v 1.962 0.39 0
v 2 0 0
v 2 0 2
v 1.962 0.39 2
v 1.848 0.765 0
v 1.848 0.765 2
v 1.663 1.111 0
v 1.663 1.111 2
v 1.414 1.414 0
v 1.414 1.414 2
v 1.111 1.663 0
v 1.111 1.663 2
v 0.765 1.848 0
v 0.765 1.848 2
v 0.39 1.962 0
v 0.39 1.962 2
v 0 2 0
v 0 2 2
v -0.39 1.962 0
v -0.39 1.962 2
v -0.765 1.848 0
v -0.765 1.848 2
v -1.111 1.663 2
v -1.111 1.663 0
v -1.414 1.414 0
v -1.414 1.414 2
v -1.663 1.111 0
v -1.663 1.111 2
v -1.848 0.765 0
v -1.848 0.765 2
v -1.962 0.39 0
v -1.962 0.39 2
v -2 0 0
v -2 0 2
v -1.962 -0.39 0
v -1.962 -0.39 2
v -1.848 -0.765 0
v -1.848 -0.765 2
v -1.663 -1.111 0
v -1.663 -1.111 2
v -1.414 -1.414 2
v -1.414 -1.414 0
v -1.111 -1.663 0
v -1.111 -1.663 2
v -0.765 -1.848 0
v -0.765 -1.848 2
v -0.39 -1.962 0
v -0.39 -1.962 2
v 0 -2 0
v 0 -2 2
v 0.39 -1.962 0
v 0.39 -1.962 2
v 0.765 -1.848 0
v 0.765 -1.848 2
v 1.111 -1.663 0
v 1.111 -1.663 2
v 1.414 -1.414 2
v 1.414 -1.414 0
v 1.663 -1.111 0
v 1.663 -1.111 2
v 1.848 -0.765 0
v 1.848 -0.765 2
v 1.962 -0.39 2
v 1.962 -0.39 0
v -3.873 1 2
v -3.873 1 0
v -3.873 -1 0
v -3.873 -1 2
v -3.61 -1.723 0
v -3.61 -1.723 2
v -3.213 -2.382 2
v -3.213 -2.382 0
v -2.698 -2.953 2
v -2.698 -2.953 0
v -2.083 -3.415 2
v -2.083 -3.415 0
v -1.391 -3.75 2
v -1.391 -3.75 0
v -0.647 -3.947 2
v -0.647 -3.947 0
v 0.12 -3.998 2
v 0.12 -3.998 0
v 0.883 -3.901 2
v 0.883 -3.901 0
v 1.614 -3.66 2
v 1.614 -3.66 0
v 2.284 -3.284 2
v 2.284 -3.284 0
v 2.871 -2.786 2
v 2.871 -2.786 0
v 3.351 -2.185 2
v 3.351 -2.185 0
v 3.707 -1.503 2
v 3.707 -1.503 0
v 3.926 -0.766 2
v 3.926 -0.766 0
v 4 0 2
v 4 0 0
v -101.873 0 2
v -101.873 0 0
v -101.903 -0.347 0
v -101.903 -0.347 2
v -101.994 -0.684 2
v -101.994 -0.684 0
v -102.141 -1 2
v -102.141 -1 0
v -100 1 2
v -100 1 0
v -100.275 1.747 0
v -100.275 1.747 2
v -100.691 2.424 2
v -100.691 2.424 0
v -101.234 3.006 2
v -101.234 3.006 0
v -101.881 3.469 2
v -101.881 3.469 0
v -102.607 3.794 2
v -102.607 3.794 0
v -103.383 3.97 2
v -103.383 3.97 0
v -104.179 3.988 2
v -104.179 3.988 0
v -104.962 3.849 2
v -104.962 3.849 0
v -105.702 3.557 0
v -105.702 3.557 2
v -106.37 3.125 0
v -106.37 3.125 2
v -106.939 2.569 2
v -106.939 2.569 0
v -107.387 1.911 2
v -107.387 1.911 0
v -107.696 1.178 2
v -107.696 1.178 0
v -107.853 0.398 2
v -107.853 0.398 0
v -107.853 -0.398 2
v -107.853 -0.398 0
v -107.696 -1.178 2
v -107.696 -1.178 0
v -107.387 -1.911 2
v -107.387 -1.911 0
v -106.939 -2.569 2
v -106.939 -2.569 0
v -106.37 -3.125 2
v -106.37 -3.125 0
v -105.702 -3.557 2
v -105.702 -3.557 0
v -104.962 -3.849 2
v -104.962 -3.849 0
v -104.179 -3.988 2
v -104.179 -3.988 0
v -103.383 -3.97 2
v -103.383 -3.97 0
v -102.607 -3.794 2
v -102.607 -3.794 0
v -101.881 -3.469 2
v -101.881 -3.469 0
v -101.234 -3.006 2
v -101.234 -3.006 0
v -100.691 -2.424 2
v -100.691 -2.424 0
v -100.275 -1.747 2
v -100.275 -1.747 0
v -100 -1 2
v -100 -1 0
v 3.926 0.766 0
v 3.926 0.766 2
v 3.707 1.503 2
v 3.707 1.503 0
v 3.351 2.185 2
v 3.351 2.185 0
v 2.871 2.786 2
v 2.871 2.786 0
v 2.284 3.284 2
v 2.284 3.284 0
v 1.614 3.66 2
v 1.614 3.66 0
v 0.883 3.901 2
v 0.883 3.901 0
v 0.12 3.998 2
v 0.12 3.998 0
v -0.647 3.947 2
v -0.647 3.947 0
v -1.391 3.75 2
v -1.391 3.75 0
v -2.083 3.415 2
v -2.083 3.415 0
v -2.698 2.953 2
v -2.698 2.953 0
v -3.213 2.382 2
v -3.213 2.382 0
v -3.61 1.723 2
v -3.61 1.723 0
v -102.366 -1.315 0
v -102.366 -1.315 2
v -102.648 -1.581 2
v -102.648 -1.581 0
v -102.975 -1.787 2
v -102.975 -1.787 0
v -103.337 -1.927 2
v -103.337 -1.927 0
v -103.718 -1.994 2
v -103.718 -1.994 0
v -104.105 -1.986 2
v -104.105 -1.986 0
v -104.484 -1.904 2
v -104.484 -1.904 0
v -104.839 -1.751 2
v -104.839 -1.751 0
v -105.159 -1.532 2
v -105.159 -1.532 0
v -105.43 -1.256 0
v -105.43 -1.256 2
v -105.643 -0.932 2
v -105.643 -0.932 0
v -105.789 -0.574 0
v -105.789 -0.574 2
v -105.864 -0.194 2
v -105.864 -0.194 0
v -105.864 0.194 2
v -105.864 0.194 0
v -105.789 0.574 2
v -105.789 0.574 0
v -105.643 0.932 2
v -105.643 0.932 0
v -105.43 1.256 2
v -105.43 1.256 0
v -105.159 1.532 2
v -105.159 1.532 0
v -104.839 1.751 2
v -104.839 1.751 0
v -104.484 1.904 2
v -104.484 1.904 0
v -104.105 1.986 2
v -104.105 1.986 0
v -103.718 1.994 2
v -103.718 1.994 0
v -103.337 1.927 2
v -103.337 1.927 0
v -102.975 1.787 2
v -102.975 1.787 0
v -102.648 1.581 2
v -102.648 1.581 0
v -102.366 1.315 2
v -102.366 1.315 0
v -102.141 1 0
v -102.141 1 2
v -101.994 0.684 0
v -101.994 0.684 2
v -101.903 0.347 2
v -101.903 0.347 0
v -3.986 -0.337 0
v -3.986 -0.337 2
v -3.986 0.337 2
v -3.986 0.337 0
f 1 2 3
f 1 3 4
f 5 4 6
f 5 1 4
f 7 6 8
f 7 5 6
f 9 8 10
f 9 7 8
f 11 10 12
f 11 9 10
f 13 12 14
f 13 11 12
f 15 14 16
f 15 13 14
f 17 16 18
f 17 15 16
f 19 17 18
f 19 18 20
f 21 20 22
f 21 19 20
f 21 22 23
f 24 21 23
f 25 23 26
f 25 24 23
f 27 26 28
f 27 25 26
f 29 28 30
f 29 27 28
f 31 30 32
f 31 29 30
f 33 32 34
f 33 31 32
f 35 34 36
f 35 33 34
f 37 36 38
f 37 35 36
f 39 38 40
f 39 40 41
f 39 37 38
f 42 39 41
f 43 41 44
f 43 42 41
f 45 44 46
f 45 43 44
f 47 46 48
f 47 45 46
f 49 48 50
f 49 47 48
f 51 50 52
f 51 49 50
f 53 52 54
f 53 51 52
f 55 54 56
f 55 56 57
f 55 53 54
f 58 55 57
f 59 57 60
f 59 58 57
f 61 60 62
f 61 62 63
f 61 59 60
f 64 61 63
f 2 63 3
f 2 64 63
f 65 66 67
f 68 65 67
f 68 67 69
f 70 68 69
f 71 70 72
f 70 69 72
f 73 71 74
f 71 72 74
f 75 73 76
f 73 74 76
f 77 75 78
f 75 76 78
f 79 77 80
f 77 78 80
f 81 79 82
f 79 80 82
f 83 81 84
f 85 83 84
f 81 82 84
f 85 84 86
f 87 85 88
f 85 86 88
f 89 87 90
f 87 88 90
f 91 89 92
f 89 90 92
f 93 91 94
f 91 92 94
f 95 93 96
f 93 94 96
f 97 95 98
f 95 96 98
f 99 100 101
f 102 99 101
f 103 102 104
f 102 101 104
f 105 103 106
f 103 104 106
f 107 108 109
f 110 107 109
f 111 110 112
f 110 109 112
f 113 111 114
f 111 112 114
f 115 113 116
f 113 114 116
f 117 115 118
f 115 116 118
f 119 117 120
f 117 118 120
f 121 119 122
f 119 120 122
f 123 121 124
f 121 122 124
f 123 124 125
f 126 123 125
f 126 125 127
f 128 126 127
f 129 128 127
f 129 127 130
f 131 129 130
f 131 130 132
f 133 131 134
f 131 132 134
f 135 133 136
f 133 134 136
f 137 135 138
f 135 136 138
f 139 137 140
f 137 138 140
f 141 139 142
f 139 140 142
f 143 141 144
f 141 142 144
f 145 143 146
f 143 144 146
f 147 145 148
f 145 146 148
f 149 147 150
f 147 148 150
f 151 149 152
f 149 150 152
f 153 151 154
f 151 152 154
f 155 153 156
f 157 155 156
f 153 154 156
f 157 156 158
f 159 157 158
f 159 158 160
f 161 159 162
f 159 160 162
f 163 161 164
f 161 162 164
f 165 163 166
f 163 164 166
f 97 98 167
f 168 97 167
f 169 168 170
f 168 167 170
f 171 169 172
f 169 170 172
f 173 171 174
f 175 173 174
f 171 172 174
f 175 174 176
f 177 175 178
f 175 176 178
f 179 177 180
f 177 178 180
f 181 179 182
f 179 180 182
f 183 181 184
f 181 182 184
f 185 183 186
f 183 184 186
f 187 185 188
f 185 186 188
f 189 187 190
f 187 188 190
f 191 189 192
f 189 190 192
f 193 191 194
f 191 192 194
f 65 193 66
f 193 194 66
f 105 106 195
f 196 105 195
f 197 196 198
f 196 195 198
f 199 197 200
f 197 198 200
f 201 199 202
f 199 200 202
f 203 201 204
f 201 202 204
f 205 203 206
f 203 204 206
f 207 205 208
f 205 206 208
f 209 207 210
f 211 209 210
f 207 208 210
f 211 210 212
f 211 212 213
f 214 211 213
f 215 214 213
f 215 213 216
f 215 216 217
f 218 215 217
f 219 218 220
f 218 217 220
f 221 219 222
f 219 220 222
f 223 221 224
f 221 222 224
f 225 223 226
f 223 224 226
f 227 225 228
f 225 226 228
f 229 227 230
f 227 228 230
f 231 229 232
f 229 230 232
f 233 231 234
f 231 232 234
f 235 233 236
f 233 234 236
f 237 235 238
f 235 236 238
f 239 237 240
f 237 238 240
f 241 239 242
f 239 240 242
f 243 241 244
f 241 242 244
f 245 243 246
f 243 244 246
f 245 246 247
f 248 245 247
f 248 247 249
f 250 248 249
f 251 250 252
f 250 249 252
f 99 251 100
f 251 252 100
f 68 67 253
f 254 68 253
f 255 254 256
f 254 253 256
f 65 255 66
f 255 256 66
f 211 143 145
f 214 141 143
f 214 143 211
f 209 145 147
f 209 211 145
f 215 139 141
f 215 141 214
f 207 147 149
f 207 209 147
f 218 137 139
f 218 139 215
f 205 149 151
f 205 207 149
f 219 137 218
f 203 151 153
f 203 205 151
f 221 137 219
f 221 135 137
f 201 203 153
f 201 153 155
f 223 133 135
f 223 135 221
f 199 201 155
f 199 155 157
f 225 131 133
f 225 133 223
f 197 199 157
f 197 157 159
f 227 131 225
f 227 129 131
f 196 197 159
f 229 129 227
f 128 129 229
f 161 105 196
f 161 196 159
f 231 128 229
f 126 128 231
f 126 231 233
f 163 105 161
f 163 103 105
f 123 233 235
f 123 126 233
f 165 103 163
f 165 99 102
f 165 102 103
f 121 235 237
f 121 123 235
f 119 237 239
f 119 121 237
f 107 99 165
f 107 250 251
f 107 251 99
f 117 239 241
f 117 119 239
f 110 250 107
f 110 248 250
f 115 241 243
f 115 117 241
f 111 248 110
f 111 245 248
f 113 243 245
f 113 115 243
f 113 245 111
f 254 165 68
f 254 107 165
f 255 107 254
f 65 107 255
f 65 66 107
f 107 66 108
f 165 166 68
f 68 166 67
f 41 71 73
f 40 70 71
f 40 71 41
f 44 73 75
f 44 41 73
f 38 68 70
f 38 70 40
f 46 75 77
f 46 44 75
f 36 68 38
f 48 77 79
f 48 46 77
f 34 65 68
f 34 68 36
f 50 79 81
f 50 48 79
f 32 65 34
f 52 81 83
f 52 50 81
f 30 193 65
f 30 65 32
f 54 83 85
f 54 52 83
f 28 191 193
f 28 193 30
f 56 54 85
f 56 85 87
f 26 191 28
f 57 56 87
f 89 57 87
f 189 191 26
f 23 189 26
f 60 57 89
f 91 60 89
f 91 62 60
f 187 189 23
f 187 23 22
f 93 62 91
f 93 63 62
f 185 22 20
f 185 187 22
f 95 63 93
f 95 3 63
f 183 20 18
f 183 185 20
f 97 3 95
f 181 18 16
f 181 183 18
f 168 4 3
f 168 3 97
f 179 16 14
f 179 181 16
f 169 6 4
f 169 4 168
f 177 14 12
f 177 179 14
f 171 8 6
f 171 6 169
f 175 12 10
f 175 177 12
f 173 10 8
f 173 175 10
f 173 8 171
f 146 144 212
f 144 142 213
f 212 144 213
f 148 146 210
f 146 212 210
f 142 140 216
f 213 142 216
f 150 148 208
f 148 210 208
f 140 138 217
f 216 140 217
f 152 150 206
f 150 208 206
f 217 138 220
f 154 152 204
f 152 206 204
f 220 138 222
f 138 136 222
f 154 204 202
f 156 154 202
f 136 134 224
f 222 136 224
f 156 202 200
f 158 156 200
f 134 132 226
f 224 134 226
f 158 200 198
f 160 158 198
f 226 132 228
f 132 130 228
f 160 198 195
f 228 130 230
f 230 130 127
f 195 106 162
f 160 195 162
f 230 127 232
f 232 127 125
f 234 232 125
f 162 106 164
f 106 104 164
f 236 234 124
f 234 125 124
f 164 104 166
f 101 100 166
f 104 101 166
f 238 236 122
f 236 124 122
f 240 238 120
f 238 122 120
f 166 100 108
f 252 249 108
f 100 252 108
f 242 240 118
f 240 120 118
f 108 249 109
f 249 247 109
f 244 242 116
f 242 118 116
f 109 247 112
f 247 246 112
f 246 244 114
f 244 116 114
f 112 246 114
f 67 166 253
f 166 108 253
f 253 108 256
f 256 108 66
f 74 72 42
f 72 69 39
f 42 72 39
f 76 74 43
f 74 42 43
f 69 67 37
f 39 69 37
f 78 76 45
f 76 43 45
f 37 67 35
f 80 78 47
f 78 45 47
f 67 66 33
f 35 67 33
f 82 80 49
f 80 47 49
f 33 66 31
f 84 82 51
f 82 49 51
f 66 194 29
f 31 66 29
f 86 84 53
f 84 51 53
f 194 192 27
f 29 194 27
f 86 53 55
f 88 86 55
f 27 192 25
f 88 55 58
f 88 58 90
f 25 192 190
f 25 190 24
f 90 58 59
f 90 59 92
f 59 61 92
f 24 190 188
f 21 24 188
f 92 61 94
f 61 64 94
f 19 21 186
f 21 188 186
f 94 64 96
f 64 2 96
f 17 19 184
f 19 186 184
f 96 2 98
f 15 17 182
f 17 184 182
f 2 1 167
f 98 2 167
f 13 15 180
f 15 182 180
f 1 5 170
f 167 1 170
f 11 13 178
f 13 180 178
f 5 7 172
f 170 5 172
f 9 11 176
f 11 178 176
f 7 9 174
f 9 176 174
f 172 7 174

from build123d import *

# Parameters (mm, degrees)
SKETCH2_R           = 2
BOSS_EXTRUDE1_DEPTH = 2


with BuildPart() as part:
    # Sketch2 → Boss-Extrude1 (new body)
    with BuildSketch(Plane.XY):
        with BuildLine():
            ThreePointArc((-99.872983346, 0), (-99.904864561, 0.50401717), (-100, 1))
            Line((-100, 1), (-102.140932539, 1))
            ThreePointArc((-102.140932539, 1), (-101.941131694, 0.51763809), (-101.872983346, 0))
            ThreePointArc((-101.872983346, 0), (-101.941131694, -0.51763809), (-102.140932539, -1))
            Line((-102.140932539, -1), (-100, -1))
            ThreePointArc((-100, -1), (-99.904864561, -0.50401717), (-99.872983346, 0))
        make_face()
        with BuildLine():
            Line((-102.140932539, 1), (-100, 1))
            ThreePointArc((-100, 1), (-107.872983346, 0), (-100, -1))
            Line((-100, -1), (-102.140932539, -1))
            ThreePointArc((-102.140932539, -1), (-105.872983346, 0), (-102.140932539, 1))
        make_face()
        with BuildLine():
            ThreePointArc((-3.872983346, -1), (-4, 0), (-3.872983346, 1))
            Line((-3.872983346, 1), (-100, 1))
            ThreePointArc((-100, 1), (-99.904864561, 0.50401717), (-99.872983346, 0))
            ThreePointArc((-99.872983346, 0), (-99.904864561, -0.50401717), (-100, -1))
            Line((-100, -1), (-3.872983346, -1))
        make_face()
        with BuildLine():
            ThreePointArc((4, 0), (0.50401717, 3.968118785), (-3.872983346, 1))
            Line((-3.872983346, 1), (-3.872983346, -1))
            ThreePointArc((-3.872983346, -1), (0.50401717, -3.968118785), (4, 0))
        make_face()
        Circle(SKETCH2_R, mode=Mode.SUBTRACT)
    extrude(amount=BOSS_EXTRUDE1_DEPTH)


solid = part.part
